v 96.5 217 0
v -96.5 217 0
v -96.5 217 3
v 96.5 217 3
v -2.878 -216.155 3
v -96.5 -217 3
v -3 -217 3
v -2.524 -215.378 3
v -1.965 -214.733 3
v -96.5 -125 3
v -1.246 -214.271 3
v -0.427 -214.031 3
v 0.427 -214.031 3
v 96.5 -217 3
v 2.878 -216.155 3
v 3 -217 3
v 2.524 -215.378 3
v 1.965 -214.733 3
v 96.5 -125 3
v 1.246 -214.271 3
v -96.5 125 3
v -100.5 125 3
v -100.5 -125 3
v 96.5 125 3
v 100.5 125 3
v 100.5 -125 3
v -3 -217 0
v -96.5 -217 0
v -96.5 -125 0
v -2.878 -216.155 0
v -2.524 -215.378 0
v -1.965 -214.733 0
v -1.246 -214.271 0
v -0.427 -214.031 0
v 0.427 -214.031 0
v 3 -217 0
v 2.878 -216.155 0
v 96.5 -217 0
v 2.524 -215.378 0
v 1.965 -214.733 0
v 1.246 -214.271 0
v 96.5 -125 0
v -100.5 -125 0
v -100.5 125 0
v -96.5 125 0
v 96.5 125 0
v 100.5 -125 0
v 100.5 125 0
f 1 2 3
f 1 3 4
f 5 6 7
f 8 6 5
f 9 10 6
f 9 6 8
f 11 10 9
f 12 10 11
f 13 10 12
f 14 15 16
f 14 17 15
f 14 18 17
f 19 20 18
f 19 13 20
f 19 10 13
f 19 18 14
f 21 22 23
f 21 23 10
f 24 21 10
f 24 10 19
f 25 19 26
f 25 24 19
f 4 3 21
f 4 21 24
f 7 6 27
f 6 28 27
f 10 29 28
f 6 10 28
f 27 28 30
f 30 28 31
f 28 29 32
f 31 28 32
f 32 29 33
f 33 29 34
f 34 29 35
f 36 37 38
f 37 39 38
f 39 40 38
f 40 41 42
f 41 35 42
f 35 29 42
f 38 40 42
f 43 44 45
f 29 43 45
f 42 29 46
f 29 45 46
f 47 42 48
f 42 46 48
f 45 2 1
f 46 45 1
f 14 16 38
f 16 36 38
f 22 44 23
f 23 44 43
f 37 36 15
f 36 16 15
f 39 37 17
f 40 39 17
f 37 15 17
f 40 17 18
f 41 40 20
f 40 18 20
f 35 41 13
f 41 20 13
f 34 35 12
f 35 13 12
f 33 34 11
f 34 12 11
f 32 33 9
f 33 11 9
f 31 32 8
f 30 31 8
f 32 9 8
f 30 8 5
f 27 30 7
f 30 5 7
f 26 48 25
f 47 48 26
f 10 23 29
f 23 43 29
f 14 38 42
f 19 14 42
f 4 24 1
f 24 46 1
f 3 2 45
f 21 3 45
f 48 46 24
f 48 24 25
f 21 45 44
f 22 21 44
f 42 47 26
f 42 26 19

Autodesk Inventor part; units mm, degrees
ref_plane "YZ Plane" through (0, 0, 0) normal (1, 0, 0) x (0, 1, 0)
ref_plane "XZ Plane" through (0, 0, 0) normal (0, 1, 0) x (-1, 0, 0)
ref_plane "XY Plane" through (0, 0, 0) normal (0, 0, 1) x (1, 0, 0)
sketch "Sketch1" plane through (0, 0, 0) normal (0, 0, 1) x (1, 0, 0)
  line L0 (-96.5, -217) -> (96.5, -217)
  line L1 (96.5, -217) -> (96.5, 217)
  line L2 (-96.5, 217) -> (-96.5, -217)
  line L3 (-96.5, -217) -> (96.5, 217) construction
  line L4 (96.5, -217) -> (-96.5, 217) construction
  line L5 (-96.5, 217) -> (96.5, 217)
  line L6 (-96.5, 125) -> (-100.5, 125)
  line L7 (-100.5, 125) -> (-100.5, -125)
  line L8 (-100.5, -125) -> (-96.5, -125)
  line L9 (-96.5, -125) -> (-96.5, 125)
  line L10 (0, 217) -> (0, 0)
  line L11 (96.5, 125) -> (100.5, 125)
  line L12 (100.5, 125) -> (100.5, -125)
  line L13 (100.5, -125) -> (96.5, -125)
  line L14 (96.5, -125) -> (96.5, 125)
  point P0 (-100.5, 0)
  point P1 (-96.5, 0)
  point P2 (-96.5, -125)
  point P3 (100.5, 0)
  point P4 (96.5, 0)
  point P5 (96.5, 125)
  point P6 (96.5, -125)
  dimension "d0" = 434
  dimension "d1" = 193
  dimension "d3" = 4
  dimension "d4" = 250
extrude "Plate1" add sketch "Sketch1" along normal blind 3
sketch "Sketch2" plane through (0, 0, 3) normal (0, 0, 1) x (1, 0, 0)
  line L0 (-96.5, -217) -> (96.5, -217) projected
  arc A0 (3, -217) -> (-3, -217) centre (0, -217) ccw
  line L1 (96.5, -217) -> (-96.5, -217) projected
  point P0 (0, 0)
  dimension "d6" = 3
extrude "Cut1" cut sketch "Sketch2" against normal blind 3
equation "\"d7\" = Thickness"
equation "\"d5\" = Thickness"
equation "\"BendRadius\" = Thickness"
equation "\"BendReliefWidth\" = Thickness"
equation "\"BendReliefDepth\" = 0.5 * Thickness"
equation "\"CornerReliefSize\" = 4 * Thickness"
equation "\"MinimumRemnant\" = 2 * Thickness"
equation "\"TransitionRadius\" = BendRadius"
equation "\"JacobiRadiusSize\" = BendRadius"
equation "\"GapSize\" = Thickness"
equation "\"Thickness\" = 3"
properties part number "Finishing Sheets .3  ( Back )"
